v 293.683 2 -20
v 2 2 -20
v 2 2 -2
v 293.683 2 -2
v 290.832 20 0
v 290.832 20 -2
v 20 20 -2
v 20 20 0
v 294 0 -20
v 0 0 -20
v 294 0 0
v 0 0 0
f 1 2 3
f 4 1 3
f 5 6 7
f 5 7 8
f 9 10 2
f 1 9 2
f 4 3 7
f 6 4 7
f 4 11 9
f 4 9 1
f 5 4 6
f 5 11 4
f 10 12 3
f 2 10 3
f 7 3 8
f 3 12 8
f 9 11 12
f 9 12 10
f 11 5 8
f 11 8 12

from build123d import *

# Parameters (mm, degrees)
BOSS_EXTRUDE1_DEPTH = 294
CUT_EXTRUDE1_DEPTH  = 296.357410606


with BuildPart() as part:
    # Sketch1 → Boss-Extrude1 (new body)
    with BuildSketch(Plane(origin=(0, 0, 0), x_dir=(0, 0, -1), z_dir=(1, 0, 0))):
        Polygon((0, 20), (0, 0), (20, 0), (20, 2), (2, 2), (2, 20), align=None)
    extrude(amount=BOSS_EXTRUDE1_DEPTH)

    # Sketch2 → Cut-Extrude1 (cut, through all)
    with BuildSketch(Plane(origin=(0, 0, 0), x_dir=(-1, 0, 0), z_dir=(0, 0, -1))):
        Polygon((0, 0), (-20, 20), (0, 20), align=None)
        Polygon((-294, 0), (-290.832311194, 20), (-294, 20), align=None)
    extrude(amount=CUT_EXTRUDE1_DEPTH, mode=Mode.SUBTRACT)


solid = part.part
